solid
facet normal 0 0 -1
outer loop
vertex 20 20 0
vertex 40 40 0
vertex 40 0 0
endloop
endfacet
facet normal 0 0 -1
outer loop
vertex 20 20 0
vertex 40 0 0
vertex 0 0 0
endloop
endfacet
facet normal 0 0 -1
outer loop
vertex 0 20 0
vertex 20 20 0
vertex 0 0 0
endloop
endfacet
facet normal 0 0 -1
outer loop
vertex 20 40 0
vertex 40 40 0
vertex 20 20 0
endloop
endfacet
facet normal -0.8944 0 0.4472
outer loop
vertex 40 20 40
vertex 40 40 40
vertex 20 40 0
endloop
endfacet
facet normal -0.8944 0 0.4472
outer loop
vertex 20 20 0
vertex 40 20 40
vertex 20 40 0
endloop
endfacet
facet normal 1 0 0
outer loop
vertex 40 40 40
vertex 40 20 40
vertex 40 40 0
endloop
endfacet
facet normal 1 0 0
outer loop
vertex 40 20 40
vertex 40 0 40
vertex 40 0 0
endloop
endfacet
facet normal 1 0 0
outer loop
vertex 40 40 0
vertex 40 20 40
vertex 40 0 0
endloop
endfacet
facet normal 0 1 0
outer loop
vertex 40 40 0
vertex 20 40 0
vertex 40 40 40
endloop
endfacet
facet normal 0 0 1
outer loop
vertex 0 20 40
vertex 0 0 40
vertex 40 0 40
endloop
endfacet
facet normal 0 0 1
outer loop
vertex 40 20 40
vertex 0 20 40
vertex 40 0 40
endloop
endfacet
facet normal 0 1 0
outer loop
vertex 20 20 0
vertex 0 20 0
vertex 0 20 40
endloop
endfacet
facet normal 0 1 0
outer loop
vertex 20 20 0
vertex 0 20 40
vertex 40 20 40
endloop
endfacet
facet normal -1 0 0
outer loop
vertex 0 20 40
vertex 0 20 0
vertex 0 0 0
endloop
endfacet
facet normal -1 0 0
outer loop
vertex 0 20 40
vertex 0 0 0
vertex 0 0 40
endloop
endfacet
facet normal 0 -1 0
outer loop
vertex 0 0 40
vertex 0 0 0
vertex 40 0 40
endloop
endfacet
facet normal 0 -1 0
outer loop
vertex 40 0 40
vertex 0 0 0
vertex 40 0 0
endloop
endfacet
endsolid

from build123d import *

# Parameters (mm, degrees)
SKETCH1_W           = 40
SKETCH1_H           = 20
BOSS_EXTRUDE2_DEPTH = 40
CUT_EXTRUDE1_DEPTH  = 40
BOSS_EXTRUDE3_DEPTH = 20
BOSS_EXTRUDE4_DEPTH = 20
CUT_EXTRUDE2_DEPTH  = 20
SKETCH6_W           = 20
SKETCH6_H           = 20
CUT_EXTRUDE3_DEPTH  = 109
BOSS_EXTRUDE5_DEPTH = 20
BOSS_EXTRUDE6_DEPTH = 20
CUT_EXTRUDE5_DEPTH  = 20


with BuildPart() as part:
    # Sketch1 → Boss-Extrude2 (new body)
    with BuildSketch(Plane.XY):
        with Locations((20, 10)):
            Rectangle(SKETCH1_W, SKETCH1_H)
    extrude(amount=BOSS_EXTRUDE2_DEPTH)

    # Sketch2 → Cut-Extrude1 (cut)
    with BuildSketch(Plane(origin=(0, 20, 0), x_dir=(1, 0, 0), z_dir=(0, 1, 0))):
        Polygon((0, -40), (20, 0), (0, 0), align=None)
    extrude(amount=-CUT_EXTRUDE1_DEPTH, mode=Mode.SUBTRACT)

    # Sketch3 → Boss-Extrude3 (add)
    with BuildSketch(Plane(origin=(0, 20, 0), x_dir=(1, 0, 0), z_dir=(0, 1, 0))):
        Polygon((40, -40), (40, 0), (20, -40), align=None)
    extrude(amount=BOSS_EXTRUDE3_DEPTH)

    # Sketch4 → Boss-Extrude4 (add)
    with BuildSketch(Plane(origin=(0, 20, 0), x_dir=(1, 0, 0), z_dir=(0, 1, 0))):
        Polygon((0, -40), (20, 0), (40, 0), (20, -40), align=None)
    extrude(amount=BOSS_EXTRUDE4_DEPTH)

    # Sketch5 → Cut-Extrude2 (cut)
    with BuildSketch(Plane(origin=(0, 40, 0), x_dir=(1, 0, 0), z_dir=(0, 1, 0))):
        Polygon((40, 0), (20, -40), (40, -40), align=None)
    extrude(amount=-CUT_EXTRUDE2_DEPTH, mode=Mode.SUBTRACT)

    # Sketch6 → Cut-Extrude3 (cut)
    with BuildSketch(Plane.XY.offset(40)):
        with Locations((10, 30)):
            Rectangle(SKETCH6_W, SKETCH6_H)
    extrude(amount=-CUT_EXTRUDE3_DEPTH, mode=Mode.SUBTRACT)

    # Sketch7 → Boss-Extrude5 (add)
    with BuildSketch(Plane(origin=(0, 20, 0), x_dir=(1, 0, 0), z_dir=(0, 1, 0))):
        Polygon((20, 0), (0, 0), (0, -40), align=None)
    extrude(amount=-BOSS_EXTRUDE5_DEPTH)

    # Sketch8 → Boss-Extrude6 (add)
    with BuildSketch(Plane(origin=(0, 20, 0), x_dir=(1, 0, 0), z_dir=(0, 1, 0))):
        Polygon((20, -40), (40, -40), (40, 0), align=None)
    extrude(amount=BOSS_EXTRUDE6_DEPTH)

    # Sketch9 → Cut-Extrude5 (cut)
    with BuildSketch(Plane(origin=(0, 40, 0), x_dir=(1, 0, 0), z_dir=(0, 1, 0))):
        Polygon((20, -40), (30, -20), (20, 0), align=None)
        Polygon((40, -40), (30, -20), (20, -40), align=None)
    extrude(amount=-CUT_EXTRUDE5_DEPTH, mode=Mode.SUBTRACT)


solid = part.part
